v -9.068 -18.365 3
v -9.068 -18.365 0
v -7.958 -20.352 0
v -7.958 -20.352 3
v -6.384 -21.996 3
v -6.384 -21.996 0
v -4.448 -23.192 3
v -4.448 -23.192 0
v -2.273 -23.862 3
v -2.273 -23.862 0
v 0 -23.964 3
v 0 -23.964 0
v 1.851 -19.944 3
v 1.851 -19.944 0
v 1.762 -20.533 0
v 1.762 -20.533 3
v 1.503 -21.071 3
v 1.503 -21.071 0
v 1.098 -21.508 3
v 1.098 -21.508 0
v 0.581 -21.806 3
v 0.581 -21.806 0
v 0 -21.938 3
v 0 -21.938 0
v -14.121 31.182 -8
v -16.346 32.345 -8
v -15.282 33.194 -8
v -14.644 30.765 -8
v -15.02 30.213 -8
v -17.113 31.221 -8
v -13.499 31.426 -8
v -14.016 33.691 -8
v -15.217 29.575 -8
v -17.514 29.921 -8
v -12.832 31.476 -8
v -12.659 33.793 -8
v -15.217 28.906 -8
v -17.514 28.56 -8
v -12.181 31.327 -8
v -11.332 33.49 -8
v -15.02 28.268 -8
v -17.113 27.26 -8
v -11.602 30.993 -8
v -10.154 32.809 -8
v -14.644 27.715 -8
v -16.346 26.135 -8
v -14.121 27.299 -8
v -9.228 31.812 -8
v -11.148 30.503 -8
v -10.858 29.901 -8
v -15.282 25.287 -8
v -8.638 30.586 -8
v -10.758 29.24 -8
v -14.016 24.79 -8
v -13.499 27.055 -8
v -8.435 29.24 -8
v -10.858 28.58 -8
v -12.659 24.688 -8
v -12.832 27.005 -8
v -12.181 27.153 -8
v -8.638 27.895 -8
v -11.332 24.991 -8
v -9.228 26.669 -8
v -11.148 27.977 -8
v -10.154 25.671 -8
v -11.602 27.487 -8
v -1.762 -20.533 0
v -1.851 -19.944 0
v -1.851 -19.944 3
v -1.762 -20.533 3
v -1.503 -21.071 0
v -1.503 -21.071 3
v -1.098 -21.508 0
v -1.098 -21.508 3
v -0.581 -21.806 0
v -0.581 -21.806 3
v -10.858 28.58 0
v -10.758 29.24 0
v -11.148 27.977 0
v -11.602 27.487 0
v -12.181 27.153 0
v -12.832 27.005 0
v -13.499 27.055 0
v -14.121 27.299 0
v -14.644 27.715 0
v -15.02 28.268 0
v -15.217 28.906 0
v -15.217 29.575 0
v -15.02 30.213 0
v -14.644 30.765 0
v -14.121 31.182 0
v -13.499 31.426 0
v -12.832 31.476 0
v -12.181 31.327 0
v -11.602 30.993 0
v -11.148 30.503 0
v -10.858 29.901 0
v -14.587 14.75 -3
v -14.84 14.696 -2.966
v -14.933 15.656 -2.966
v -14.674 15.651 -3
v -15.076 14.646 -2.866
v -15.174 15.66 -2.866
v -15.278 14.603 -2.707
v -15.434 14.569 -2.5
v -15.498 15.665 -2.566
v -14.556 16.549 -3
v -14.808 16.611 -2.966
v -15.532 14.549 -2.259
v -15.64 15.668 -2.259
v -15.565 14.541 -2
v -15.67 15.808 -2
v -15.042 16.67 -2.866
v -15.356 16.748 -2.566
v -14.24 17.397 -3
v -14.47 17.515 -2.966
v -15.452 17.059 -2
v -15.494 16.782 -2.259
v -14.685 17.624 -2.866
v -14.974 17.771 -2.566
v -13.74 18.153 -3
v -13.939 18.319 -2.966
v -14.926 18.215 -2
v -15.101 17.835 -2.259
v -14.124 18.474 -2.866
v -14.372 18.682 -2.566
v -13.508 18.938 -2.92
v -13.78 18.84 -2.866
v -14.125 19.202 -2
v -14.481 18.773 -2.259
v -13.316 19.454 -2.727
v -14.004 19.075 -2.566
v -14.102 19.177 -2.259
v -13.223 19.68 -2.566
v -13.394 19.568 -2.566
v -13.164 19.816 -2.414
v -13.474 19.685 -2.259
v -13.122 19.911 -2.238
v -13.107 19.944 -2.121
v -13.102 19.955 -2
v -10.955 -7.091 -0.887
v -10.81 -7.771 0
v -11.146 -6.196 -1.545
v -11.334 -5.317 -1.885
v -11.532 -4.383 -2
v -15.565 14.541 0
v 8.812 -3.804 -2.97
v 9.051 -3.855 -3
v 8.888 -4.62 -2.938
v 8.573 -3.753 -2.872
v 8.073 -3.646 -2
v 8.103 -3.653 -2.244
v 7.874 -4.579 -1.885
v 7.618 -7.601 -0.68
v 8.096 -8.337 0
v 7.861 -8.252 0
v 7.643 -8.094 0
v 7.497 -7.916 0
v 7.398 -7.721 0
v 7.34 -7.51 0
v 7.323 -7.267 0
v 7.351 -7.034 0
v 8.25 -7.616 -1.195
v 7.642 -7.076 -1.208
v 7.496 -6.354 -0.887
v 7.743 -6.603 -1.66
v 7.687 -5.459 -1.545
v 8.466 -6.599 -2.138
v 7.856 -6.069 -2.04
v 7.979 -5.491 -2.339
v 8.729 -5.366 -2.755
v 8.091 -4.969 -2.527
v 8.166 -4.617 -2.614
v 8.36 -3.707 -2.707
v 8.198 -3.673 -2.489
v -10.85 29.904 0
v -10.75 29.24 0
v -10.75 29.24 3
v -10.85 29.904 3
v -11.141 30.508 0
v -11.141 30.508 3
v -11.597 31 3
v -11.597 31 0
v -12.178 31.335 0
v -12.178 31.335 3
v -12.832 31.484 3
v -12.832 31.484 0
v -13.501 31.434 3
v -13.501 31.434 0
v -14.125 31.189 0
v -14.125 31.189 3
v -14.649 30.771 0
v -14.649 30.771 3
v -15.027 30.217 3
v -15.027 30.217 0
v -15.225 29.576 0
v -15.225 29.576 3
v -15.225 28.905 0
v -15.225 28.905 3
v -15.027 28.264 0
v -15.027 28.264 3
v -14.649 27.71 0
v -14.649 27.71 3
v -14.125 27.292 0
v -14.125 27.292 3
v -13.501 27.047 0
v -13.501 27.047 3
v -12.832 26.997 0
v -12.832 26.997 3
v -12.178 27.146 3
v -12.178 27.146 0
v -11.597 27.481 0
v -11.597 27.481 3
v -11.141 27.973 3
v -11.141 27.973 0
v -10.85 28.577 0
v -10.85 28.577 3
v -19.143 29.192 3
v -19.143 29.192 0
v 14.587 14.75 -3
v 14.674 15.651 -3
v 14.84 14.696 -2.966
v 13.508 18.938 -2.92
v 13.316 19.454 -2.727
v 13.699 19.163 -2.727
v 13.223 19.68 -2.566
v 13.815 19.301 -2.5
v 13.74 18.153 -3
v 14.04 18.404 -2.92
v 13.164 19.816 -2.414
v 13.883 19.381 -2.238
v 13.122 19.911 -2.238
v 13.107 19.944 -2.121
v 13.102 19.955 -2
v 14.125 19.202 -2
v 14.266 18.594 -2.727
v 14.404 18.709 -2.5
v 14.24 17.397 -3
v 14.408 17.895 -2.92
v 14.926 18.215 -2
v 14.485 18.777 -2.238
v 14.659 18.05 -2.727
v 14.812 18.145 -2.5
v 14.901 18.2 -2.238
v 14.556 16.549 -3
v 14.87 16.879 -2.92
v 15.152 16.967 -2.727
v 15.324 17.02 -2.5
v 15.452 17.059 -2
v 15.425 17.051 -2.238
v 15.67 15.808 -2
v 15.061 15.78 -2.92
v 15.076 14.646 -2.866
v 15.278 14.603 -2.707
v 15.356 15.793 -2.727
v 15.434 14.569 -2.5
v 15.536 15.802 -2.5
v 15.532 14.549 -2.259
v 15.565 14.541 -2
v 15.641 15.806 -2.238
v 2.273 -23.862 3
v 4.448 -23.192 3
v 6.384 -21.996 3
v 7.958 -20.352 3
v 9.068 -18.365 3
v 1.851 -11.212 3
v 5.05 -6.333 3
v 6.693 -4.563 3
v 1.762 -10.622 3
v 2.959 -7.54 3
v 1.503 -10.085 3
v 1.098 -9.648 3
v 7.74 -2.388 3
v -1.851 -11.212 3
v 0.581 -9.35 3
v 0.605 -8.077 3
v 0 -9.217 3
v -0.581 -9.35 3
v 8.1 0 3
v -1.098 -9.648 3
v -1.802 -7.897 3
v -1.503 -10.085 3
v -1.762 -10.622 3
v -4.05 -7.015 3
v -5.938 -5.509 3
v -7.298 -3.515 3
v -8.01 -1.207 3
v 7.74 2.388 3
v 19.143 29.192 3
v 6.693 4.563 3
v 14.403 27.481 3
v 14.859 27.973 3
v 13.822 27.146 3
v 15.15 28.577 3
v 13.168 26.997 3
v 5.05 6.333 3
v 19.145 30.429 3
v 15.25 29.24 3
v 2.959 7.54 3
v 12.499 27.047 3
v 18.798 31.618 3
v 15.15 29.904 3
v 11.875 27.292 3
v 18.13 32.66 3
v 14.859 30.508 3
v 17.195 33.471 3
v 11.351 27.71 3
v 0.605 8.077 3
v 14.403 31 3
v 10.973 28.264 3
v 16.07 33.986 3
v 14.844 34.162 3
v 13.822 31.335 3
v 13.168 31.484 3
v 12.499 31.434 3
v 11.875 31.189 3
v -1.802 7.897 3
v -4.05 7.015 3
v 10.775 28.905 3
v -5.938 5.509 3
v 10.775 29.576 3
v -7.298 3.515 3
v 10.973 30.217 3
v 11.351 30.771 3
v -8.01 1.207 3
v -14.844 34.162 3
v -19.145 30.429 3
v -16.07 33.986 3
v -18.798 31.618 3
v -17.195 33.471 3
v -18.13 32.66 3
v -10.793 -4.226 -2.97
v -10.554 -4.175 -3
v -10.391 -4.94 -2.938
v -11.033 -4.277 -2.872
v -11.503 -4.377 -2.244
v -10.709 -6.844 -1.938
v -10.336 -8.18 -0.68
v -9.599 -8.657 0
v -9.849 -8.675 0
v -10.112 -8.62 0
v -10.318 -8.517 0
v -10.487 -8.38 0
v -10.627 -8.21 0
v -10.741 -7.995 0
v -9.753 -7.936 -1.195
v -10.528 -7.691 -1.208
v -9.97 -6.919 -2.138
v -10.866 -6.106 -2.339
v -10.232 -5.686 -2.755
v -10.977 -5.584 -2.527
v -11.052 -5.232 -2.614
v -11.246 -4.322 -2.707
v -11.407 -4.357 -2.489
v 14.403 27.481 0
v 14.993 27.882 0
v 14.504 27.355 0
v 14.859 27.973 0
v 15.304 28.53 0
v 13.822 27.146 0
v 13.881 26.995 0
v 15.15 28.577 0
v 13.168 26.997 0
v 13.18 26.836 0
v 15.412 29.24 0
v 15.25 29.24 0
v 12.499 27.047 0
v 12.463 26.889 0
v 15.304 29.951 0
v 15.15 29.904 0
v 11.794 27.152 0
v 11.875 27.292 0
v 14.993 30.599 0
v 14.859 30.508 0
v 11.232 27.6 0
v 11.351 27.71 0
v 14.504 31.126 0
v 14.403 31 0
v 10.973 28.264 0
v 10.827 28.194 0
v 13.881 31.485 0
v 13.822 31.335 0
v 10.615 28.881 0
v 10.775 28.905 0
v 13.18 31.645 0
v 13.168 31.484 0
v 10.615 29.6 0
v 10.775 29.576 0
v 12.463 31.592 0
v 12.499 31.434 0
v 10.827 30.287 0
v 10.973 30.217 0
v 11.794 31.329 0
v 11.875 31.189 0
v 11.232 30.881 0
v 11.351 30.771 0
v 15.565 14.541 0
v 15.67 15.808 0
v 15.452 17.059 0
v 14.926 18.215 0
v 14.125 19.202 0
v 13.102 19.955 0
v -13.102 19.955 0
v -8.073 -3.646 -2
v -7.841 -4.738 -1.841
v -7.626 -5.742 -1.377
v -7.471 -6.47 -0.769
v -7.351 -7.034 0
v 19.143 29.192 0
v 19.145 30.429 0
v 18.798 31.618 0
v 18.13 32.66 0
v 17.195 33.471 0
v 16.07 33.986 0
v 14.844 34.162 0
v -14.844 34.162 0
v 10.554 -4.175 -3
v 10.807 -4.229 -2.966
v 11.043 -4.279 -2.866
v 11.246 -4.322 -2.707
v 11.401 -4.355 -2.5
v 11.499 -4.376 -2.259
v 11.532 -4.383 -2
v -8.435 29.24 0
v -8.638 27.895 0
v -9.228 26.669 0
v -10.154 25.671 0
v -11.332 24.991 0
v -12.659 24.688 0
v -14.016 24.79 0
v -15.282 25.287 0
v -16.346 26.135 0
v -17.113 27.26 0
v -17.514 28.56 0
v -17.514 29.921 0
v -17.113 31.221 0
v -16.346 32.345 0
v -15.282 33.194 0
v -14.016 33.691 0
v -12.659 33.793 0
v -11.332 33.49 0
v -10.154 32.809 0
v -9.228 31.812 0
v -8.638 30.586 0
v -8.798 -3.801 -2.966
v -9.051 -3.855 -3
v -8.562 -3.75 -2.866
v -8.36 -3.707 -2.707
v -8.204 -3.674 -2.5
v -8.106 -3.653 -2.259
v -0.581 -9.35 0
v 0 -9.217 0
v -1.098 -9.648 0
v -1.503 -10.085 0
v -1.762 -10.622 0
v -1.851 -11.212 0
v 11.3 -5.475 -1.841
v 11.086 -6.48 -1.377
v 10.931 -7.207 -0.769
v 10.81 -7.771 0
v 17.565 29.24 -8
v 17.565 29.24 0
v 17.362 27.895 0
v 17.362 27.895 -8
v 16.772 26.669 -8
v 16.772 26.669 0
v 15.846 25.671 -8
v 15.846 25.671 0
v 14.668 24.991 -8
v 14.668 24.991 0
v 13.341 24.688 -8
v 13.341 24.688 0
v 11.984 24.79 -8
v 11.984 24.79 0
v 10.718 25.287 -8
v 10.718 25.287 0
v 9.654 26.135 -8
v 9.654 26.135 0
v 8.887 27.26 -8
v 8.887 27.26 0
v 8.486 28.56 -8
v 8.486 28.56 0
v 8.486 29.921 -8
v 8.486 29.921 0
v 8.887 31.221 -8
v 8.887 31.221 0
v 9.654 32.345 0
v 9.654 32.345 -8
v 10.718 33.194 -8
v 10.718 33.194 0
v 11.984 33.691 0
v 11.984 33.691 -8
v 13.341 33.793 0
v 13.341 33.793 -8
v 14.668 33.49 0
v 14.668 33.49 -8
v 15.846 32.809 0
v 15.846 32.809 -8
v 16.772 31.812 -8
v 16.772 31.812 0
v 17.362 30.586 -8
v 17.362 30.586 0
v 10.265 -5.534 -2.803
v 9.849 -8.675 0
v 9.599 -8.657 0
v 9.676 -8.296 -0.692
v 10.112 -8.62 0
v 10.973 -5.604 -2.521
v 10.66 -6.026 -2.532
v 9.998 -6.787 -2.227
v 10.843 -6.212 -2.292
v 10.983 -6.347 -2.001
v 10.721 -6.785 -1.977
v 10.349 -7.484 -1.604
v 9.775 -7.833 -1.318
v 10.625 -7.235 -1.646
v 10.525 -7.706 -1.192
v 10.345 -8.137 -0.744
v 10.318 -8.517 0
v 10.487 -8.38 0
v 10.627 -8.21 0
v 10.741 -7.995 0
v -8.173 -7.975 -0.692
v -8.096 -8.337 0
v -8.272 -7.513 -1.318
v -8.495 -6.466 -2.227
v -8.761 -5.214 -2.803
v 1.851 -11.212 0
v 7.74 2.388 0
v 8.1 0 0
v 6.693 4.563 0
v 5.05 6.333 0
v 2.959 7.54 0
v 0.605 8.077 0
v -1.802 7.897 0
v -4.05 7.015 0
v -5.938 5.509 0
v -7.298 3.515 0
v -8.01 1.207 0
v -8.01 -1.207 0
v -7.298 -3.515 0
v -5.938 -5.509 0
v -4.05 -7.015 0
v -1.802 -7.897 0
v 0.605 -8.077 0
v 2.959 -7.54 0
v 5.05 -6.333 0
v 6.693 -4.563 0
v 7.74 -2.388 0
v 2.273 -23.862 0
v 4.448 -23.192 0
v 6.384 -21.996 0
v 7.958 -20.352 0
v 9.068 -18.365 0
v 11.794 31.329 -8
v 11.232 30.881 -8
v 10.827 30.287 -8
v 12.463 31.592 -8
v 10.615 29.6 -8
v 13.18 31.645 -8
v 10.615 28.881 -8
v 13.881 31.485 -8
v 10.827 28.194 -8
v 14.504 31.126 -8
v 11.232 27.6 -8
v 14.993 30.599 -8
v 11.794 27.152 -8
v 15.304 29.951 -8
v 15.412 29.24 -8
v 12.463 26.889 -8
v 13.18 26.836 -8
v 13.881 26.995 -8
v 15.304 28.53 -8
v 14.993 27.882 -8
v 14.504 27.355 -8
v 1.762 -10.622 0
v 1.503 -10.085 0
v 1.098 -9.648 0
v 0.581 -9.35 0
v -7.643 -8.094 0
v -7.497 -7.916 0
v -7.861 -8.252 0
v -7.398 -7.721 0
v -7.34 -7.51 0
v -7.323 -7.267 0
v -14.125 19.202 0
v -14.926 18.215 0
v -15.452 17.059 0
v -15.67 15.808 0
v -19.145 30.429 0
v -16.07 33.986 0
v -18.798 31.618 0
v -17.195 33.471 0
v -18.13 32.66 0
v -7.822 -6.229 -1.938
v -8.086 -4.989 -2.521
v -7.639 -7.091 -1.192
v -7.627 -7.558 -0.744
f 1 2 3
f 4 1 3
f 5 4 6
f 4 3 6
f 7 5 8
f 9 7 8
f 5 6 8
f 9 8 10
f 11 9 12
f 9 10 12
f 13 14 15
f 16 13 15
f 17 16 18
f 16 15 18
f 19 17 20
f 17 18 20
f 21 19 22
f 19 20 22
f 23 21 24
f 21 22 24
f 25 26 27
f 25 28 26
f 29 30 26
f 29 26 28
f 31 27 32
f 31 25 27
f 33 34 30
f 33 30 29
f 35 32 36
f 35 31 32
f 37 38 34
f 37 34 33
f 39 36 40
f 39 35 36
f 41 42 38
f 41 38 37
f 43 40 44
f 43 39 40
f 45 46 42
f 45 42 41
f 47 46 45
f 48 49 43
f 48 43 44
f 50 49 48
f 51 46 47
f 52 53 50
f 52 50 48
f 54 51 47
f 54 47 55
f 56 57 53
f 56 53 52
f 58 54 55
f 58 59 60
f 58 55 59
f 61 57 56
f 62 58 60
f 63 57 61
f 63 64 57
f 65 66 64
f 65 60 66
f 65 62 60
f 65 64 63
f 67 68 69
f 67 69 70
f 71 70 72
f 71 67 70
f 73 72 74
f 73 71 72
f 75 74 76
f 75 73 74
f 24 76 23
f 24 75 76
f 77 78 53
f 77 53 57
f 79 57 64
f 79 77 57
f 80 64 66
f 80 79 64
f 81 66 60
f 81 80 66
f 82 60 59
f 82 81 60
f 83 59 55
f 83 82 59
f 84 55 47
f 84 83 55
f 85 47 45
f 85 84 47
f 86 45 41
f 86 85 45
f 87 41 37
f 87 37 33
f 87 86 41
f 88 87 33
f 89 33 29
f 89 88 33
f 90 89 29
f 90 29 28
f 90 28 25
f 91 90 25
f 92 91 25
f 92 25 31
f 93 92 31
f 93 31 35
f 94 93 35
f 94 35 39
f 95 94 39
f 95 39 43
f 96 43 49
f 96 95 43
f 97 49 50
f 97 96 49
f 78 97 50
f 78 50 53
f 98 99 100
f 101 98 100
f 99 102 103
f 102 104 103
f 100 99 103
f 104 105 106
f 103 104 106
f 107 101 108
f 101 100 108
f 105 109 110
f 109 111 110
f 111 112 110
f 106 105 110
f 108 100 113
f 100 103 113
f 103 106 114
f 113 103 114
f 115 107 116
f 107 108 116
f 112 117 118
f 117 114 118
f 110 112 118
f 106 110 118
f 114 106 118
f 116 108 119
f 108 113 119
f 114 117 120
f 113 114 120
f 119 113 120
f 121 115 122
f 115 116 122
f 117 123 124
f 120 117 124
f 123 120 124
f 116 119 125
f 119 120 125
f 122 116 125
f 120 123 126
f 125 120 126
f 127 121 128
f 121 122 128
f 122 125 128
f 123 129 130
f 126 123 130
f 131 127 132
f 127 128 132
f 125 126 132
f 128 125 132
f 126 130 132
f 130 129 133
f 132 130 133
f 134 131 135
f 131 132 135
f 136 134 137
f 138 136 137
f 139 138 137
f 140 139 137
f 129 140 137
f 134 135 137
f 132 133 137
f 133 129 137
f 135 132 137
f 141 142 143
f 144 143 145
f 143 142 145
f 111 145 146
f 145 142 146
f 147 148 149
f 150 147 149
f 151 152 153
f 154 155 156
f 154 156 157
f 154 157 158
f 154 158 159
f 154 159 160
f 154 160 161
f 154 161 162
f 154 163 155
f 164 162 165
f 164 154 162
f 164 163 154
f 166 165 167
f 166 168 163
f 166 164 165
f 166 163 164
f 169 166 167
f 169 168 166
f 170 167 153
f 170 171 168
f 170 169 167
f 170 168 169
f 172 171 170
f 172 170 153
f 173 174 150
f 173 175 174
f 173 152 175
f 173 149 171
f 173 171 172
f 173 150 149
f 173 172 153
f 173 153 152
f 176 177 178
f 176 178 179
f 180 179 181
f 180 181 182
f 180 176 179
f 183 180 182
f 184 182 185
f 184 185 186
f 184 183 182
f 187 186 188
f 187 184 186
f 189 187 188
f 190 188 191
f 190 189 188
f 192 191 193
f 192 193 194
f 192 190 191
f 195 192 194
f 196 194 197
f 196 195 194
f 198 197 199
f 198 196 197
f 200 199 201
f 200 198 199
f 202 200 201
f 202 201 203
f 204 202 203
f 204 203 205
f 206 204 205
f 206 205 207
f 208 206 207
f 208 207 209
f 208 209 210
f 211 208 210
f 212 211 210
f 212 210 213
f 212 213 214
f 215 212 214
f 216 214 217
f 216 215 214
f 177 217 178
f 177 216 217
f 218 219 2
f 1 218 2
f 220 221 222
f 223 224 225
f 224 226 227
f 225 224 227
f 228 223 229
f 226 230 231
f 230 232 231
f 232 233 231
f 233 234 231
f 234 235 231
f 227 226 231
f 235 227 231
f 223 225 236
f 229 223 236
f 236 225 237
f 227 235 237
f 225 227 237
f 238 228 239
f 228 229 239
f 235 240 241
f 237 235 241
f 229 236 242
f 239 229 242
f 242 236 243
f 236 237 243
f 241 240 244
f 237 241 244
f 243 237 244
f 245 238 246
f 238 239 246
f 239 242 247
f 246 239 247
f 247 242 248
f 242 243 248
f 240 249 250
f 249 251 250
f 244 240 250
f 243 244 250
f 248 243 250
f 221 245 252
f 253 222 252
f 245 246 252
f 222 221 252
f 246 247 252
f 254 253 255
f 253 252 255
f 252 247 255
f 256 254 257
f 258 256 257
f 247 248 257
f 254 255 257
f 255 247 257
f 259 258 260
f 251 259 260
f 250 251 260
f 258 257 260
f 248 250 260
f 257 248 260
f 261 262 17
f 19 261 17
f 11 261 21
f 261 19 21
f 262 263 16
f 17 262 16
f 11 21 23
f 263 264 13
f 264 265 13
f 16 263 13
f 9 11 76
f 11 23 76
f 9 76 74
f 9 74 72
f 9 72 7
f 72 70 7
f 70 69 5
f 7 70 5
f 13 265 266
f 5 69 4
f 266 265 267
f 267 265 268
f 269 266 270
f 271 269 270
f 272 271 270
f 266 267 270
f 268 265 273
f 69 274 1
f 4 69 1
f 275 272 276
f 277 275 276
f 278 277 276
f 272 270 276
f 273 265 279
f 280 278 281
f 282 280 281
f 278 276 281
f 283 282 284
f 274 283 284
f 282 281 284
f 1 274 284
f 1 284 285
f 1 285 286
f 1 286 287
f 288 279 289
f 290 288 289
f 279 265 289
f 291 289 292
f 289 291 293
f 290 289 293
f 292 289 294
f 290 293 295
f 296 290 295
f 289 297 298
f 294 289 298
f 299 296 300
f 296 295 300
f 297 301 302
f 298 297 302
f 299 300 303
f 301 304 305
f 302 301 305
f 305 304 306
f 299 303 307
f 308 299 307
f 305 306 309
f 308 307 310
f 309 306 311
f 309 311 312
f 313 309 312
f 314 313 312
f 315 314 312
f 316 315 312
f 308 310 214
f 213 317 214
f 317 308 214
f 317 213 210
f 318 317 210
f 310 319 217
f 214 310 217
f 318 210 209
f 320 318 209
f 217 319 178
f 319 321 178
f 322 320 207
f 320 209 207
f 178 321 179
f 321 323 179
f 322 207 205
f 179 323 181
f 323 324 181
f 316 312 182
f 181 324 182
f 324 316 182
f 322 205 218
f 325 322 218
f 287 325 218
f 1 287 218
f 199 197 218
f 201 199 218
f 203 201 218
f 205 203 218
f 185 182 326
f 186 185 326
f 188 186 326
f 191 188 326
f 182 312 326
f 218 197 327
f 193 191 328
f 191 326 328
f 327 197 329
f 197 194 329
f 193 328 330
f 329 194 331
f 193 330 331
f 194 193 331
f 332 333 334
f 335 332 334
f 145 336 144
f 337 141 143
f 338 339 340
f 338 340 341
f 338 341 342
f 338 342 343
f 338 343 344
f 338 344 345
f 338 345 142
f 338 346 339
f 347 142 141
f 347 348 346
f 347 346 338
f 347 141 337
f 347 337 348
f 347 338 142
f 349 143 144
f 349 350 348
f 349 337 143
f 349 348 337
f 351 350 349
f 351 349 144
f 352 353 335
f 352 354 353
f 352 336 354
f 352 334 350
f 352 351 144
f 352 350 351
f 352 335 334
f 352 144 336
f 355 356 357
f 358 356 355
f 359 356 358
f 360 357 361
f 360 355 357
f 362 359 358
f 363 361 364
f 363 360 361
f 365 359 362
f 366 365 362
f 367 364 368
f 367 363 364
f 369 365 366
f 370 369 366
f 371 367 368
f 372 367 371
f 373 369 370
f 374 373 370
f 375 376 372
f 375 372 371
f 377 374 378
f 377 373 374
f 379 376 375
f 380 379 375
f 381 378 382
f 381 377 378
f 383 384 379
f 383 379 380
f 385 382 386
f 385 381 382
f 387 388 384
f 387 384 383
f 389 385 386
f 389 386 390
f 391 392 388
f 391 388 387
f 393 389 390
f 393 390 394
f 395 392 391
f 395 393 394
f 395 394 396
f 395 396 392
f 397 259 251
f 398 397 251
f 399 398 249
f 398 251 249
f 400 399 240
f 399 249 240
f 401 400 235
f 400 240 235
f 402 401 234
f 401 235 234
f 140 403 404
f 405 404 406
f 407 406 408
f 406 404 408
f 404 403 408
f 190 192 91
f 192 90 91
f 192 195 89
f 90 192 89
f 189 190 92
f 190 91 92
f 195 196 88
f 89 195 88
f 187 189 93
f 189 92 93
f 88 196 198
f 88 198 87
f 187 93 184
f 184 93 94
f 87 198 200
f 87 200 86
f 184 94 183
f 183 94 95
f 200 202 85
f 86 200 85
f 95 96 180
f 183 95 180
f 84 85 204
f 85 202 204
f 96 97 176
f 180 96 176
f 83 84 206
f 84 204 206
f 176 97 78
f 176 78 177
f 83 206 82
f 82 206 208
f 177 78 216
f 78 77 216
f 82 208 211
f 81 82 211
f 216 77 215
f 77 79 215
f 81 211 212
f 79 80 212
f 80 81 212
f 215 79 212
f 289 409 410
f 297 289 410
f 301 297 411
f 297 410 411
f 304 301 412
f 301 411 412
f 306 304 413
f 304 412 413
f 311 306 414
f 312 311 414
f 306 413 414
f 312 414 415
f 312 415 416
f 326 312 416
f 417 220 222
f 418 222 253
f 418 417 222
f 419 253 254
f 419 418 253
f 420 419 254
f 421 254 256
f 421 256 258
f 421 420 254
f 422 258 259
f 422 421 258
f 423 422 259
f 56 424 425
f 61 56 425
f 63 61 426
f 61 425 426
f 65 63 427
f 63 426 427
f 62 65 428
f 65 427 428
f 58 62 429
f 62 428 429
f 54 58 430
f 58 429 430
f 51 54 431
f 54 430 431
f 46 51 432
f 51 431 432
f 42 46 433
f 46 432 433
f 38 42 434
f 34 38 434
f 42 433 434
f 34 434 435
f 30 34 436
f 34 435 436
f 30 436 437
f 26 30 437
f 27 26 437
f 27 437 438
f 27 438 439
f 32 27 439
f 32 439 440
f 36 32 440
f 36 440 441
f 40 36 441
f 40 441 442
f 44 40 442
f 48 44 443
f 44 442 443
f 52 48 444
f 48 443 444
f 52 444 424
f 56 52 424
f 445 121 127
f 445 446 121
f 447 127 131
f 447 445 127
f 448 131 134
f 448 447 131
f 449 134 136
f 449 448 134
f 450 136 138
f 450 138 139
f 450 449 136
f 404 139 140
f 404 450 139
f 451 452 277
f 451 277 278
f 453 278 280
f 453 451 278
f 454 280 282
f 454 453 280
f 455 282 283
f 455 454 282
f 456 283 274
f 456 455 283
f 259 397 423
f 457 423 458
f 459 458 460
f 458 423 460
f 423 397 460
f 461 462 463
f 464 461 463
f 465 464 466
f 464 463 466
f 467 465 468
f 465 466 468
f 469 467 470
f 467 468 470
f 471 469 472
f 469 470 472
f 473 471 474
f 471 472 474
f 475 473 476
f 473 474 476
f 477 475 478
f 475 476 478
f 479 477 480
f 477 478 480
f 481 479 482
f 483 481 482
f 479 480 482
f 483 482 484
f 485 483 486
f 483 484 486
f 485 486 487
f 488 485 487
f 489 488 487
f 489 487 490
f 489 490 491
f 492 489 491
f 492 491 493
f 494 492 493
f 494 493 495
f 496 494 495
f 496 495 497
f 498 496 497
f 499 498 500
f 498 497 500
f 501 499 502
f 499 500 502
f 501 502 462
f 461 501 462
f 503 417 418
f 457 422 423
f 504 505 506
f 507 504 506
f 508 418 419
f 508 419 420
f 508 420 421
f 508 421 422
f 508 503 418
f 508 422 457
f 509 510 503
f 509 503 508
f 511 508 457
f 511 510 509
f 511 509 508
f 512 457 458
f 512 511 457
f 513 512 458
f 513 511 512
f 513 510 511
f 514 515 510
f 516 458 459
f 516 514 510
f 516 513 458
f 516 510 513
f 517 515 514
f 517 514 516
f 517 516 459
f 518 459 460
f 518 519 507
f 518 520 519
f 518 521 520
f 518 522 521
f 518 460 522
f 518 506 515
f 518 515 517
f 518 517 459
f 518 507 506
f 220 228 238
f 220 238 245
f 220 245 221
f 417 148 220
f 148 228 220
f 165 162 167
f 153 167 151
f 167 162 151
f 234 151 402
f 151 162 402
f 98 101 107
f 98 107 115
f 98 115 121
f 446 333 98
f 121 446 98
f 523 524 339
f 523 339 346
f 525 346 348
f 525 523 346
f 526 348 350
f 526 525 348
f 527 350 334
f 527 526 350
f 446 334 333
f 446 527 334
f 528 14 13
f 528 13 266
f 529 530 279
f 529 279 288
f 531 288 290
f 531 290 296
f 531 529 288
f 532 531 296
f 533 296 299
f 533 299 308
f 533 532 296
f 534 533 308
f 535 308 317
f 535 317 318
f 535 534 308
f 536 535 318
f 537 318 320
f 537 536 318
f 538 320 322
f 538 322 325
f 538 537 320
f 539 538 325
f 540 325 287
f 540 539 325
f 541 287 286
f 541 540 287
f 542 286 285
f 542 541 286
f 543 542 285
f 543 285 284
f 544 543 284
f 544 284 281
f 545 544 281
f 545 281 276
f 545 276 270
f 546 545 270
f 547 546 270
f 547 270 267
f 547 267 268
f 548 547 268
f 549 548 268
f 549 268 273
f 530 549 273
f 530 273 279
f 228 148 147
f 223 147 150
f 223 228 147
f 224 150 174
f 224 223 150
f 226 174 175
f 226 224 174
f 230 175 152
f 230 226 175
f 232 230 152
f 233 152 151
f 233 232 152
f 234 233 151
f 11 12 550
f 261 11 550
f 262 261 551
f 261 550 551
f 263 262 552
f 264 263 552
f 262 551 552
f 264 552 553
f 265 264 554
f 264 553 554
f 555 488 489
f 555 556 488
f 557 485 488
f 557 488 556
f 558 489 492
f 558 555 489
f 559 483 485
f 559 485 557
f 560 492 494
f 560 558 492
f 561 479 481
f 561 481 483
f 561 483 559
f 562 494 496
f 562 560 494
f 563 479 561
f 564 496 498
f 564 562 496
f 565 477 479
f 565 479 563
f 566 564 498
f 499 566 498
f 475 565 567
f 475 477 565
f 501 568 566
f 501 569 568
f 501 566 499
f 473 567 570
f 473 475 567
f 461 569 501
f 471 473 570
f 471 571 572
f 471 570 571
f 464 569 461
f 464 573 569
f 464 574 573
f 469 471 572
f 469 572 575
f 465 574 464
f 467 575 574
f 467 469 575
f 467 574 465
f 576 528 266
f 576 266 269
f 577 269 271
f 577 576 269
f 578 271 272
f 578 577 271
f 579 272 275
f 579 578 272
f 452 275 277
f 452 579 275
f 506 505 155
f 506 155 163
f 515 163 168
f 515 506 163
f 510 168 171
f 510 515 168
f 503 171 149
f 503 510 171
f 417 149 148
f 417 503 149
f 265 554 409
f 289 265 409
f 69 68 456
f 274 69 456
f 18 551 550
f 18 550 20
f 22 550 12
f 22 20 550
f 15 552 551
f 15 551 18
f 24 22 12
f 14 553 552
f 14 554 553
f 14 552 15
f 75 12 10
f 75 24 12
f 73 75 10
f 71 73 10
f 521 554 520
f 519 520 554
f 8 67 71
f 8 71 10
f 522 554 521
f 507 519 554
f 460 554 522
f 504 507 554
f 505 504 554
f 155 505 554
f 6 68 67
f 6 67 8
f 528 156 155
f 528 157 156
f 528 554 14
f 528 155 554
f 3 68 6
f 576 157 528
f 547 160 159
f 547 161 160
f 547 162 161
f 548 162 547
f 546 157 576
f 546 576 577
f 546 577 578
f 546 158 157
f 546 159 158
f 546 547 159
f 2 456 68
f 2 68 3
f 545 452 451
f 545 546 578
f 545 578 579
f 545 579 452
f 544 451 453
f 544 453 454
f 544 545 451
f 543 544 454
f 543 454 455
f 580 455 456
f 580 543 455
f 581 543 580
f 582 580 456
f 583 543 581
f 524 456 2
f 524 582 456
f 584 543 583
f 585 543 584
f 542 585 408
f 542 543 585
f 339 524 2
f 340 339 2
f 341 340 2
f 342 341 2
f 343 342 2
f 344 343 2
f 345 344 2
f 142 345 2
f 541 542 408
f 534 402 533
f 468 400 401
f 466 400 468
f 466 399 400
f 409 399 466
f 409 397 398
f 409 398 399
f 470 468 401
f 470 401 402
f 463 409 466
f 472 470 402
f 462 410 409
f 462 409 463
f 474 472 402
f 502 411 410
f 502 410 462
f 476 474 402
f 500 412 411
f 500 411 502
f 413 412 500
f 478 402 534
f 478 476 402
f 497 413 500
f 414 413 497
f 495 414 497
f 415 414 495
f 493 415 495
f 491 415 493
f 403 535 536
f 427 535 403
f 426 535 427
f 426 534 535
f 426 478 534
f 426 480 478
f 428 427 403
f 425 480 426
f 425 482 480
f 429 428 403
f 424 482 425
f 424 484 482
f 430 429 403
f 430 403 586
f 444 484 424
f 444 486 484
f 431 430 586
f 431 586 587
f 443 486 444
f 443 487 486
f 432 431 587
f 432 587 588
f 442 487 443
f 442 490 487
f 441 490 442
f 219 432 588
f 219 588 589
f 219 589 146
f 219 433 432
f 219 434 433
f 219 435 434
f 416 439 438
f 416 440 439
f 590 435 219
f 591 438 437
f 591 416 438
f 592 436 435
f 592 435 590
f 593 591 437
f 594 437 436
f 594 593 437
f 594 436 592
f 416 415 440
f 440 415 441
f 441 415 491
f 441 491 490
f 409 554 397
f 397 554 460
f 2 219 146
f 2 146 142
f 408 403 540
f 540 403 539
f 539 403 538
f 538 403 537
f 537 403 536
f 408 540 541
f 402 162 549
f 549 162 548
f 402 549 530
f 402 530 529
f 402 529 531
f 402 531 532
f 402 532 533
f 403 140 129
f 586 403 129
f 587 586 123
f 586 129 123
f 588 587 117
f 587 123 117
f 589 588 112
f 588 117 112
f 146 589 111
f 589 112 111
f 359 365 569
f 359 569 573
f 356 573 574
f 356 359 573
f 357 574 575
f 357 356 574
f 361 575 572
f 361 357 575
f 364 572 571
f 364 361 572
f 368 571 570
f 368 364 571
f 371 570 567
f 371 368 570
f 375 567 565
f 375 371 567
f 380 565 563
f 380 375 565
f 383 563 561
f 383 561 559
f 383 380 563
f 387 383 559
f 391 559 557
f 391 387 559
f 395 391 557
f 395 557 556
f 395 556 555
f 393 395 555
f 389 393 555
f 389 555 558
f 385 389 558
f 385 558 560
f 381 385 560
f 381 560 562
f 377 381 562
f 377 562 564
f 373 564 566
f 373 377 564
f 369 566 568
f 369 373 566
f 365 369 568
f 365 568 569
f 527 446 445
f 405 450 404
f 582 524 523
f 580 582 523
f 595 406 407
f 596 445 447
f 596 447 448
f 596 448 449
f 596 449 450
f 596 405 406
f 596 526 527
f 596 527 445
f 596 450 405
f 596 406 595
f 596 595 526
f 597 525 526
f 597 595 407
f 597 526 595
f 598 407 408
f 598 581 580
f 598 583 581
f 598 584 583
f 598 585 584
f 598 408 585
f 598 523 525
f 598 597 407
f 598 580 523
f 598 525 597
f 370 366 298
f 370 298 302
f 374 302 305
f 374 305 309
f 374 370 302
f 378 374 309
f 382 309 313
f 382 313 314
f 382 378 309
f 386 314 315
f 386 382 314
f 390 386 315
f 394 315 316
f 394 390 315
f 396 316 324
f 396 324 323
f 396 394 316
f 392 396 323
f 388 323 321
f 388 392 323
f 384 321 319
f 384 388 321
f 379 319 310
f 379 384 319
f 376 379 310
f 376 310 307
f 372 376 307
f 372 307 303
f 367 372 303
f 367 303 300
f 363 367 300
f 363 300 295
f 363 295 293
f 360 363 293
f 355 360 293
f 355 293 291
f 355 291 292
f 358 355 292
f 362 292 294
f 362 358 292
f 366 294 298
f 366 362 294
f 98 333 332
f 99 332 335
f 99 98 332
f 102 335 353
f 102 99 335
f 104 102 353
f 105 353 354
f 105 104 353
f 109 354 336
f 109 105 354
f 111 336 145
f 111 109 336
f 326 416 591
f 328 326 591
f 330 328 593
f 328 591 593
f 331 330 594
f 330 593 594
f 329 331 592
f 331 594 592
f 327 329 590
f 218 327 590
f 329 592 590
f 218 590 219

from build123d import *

# Parameters (mm, degrees)
F0_W        = 3.7012519315
F0_H        = 12.7320559695
F0_R        = 8.100129487
F0_R_2      = 2.25
F1_DEPTH    = 3
F2_T1_DEPTH = 3
F3_R        = 4.5649895604
F3_R_2      = 2.4116141927
F3_R_3      = 2.2420485947
F4_DEPTH    = 8
F6_DEPTH    = 3
F7_T1_DEPTH = 14.95289459
F7_T3_DEPTH = 26.4498235383
F7_T5_DEPTH = 26.4498235383
F8_R        = 1


# Not quite as in the source:
# - a fillet or chamfer that OpenCascade refuses, or shapes differently, is made with other operations: its cross-section is extruded or revolved along the edge and cut away or added


with BuildPart() as f1:
    # F0 (on Top) → F1 (new body)
    with BuildSketch(Plane.XY):
        with BuildLine():
            Line((14.8444259539, 34.1621562839), (0, 34.1621562839))
            Line((0, 34.1621562839), (-14.8444259539, 34.1621562839))
            ThreePointArc((-14.8444259539, 34.1621562839), (-18.1303110964, 32.6596806941), (-19.1433615983, 29.1915107518))
            Line((-19.1433615983, 29.1915107518), (-9.0677291155, -18.3654725552))
            ThreePointArc((-9.0677291155, -18.3654725552), (-5.4543132889, -22.6555173257), (0, -23.9638462663))
            ThreePointArc((0, -23.9638462663), (5.4543132889, -22.6555173257), (9.0677291155, -18.3654725552))
            Line((9.0677291155, -18.3654725552), (19.1433615983, 29.1915107518))
            ThreePointArc((19.1433615983, 29.1915107518), (18.1303110964, 32.6596806941), (14.8444259539, 34.1621562839))
        make_face()
        with Locations((0, -15.5778131448)):
            Rectangle(F0_W, F0_H, mode=Mode.SUBTRACT)
        Circle(F0_R, mode=Mode.SUBTRACT)
        with Locations((-13, 29.2403830344)):
            Circle(F0_R_2, mode=Mode.SUBTRACT)
        with Locations((13, 29.2403830344)):
            Circle(F0_R_2, mode=Mode.SUBTRACT)
    extrude(amount=F1_DEPTH)

    # F2: fillet of radius 2 on 4 edges, made by hand

    # F2_s2 → F2_t1 (join)
    with BuildSketch(Plane.XY):
        with BuildLine():
            ThreePointArc((0.1493740343, -9.21178516), (-1.2648395281, -9.7975715976), (-1.8506259657, -11.21178516))
            Line((-1.8506259657, -11.21178516), (-1.8506259657, -9.21178516))
            Line((-1.8506259657, -9.21178516), (0.1493740343, -9.21178516))
        make_face()
        with BuildLine():
            ThreePointArc((1.8506259657, -11.21178516), (1.2648395281, -9.7975715976), (-0.1493740343, -9.21178516))
            Line((-0.1493740343, -9.21178516), (1.8506259657, -9.21178516))
            Line((1.8506259657, -9.21178516), (1.8506259657, -11.21178516))
        make_face()
        with BuildLine():
            ThreePointArc((-1.8506259657, -19.9438411295), (-1.2648395281, -21.3580546919), (0.1493740343, -21.9438411295))
            Line((0.1493740343, -21.9438411295), (-1.8506259657, -21.9438411295))
            Line((-1.8506259657, -21.9438411295), (-1.8506259657, -19.9438411295))
        make_face()
        with BuildLine():
            ThreePointArc((1.8506259657, -19.9438411295), (1.2648395281, -21.3580546919), (-0.1493740343, -21.9438411295))
            Line((-0.1493740343, -21.9438411295), (1.8506259657, -21.9438411295))
            Line((1.8506259657, -21.9438411295), (1.8506259657, -19.9438411295))
        make_face()
    extrude(amount=F2_T1_DEPTH)

    # F3 (on face) → F4 (join)
    with BuildSketch(Plane(origin=(0, 0, 0), x_dir=(1, 0, 0), z_dir=(0, 0, -1))):
        with Locations((13, -29.2403830344)):
            Circle(F3_R)
        with Locations((13, -29.2403830344)):
            Circle(F3_R_2, mode=Mode.SUBTRACT)
        with Locations((-13, -29.2403830344)):
            Circle(F3_R)
        with Locations((-13, -29.2403830344)):
            Circle(F3_R_3, mode=Mode.SUBTRACT)
    extrude(amount=F4_DEPTH)

    # F5 (on face) → F6 (join)
    with BuildSketch(Plane(origin=(0, 0, 0), x_dir=(1, 0, 0), z_dir=(0, 0, -1))):
        Polygon((-7.118105705, 8.1281888095), (-10.5773922314, 8.8652892849), (-16.5612712118, -19.2176554765), (-13.1019846854, -19.9547559519), align=None)
        Polygon((16.5612712118, -19.2176554765), (10.5773922314, 8.8652892849), (7.118105705, 8.1281888095), (13.1019846854, -19.9547559519), align=None)
    extrude(amount=F6_DEPTH)

    # F7: fillet of radius 5 on 4 edges, made by hand

    # F7_s2 → F7_t1 (cut)
    with BuildSketch(Plane.XY.offset(-14.95289459)):
        with BuildLine():
            ThreePointArc((-13.1019846854, 19.9547559519), (-15.2257590624, 17.6540998095), (-15.5648763993, 14.5414745957))
            Line((-15.5648763993, 14.5414745957), (-16.5612712118, 19.2176554765))
            Line((-16.5612712118, 19.2176554765), (-13.1019846854, 19.9547559519))
        make_face()
        with BuildLine():
            ThreePointArc((15.5648763993, 14.5414745957), (15.2257590624, 17.6540998095), (13.1019846854, 19.9547559519))
            Line((13.1019846854, 19.9547559519), (16.5612712118, 19.2176554765))
            Line((16.5612712118, 19.2176554765), (15.5648763993, 14.5414745957))
        make_face()
    extrude(amount=F7_T1_DEPTH, mode=Mode.SUBTRACT)

    # F7_s4 → F7_t3 (cut)
    with BuildSketch(Plane(origin=(23.1298700172, -4.9284839674, 0), x_dir=(0, 0, 1), z_dir=(-0.9780436123, 0.2084003178, 0))):
        with BuildLine():
            ThreePointArc((0, -6.4663076535), (-2.1833001327, -4.622344746), (-3, -1.8837319585))
            Line((-3, -1.8837319585), (-3, -6.4663076535))
            Line((-3, -6.4663076535), (0, -6.4663076535))
        make_face()
    extrude(amount=F7_T3_DEPTH, mode=Mode.SUBTRACT)

    # F7_s6 → F7_t5 (cut)
    with BuildSketch(Plane(origin=(2.7392109406, 0.5836676641, 0), x_dir=(0, 0, 1), z_dir=(-0.9780436123, -0.2084003178, 0))):
        with BuildLine():
            ThreePointArc((0, -6.4663076535), (-2.1833001327, -4.622344746), (-3, -1.8837319585))
            Line((-3, -1.8837319585), (-3, -6.4663076535))
            Line((-3, -6.4663076535), (0, -6.4663076535))
        make_face()
    extrude(amount=F7_T5_DEPTH, mode=Mode.SUBTRACT)

    # F8
    f8_edges = [f1.edges().sort_by_distance(p)[0] for p in [
        (-10.58755, 8.154263, -3),
        (10.58755, 8.154263, -3),
        (13.548639, 5.079072, -3),
        (-13.548639, 5.079072, -3),
        (-15.225759, 17.6541, -3),
        (-10.961675, -7.061813, -2.1833),
        (-7.502388, -6.324713, -2.1833),
        (15.225759, 17.6541, -3),
        (7.502388, -6.324713, -2.1833),
        (10.961675, -7.061813, -2.1833),
    ]]
    fillet(f8_edges, radius=F8_R)


solid = f1.part
